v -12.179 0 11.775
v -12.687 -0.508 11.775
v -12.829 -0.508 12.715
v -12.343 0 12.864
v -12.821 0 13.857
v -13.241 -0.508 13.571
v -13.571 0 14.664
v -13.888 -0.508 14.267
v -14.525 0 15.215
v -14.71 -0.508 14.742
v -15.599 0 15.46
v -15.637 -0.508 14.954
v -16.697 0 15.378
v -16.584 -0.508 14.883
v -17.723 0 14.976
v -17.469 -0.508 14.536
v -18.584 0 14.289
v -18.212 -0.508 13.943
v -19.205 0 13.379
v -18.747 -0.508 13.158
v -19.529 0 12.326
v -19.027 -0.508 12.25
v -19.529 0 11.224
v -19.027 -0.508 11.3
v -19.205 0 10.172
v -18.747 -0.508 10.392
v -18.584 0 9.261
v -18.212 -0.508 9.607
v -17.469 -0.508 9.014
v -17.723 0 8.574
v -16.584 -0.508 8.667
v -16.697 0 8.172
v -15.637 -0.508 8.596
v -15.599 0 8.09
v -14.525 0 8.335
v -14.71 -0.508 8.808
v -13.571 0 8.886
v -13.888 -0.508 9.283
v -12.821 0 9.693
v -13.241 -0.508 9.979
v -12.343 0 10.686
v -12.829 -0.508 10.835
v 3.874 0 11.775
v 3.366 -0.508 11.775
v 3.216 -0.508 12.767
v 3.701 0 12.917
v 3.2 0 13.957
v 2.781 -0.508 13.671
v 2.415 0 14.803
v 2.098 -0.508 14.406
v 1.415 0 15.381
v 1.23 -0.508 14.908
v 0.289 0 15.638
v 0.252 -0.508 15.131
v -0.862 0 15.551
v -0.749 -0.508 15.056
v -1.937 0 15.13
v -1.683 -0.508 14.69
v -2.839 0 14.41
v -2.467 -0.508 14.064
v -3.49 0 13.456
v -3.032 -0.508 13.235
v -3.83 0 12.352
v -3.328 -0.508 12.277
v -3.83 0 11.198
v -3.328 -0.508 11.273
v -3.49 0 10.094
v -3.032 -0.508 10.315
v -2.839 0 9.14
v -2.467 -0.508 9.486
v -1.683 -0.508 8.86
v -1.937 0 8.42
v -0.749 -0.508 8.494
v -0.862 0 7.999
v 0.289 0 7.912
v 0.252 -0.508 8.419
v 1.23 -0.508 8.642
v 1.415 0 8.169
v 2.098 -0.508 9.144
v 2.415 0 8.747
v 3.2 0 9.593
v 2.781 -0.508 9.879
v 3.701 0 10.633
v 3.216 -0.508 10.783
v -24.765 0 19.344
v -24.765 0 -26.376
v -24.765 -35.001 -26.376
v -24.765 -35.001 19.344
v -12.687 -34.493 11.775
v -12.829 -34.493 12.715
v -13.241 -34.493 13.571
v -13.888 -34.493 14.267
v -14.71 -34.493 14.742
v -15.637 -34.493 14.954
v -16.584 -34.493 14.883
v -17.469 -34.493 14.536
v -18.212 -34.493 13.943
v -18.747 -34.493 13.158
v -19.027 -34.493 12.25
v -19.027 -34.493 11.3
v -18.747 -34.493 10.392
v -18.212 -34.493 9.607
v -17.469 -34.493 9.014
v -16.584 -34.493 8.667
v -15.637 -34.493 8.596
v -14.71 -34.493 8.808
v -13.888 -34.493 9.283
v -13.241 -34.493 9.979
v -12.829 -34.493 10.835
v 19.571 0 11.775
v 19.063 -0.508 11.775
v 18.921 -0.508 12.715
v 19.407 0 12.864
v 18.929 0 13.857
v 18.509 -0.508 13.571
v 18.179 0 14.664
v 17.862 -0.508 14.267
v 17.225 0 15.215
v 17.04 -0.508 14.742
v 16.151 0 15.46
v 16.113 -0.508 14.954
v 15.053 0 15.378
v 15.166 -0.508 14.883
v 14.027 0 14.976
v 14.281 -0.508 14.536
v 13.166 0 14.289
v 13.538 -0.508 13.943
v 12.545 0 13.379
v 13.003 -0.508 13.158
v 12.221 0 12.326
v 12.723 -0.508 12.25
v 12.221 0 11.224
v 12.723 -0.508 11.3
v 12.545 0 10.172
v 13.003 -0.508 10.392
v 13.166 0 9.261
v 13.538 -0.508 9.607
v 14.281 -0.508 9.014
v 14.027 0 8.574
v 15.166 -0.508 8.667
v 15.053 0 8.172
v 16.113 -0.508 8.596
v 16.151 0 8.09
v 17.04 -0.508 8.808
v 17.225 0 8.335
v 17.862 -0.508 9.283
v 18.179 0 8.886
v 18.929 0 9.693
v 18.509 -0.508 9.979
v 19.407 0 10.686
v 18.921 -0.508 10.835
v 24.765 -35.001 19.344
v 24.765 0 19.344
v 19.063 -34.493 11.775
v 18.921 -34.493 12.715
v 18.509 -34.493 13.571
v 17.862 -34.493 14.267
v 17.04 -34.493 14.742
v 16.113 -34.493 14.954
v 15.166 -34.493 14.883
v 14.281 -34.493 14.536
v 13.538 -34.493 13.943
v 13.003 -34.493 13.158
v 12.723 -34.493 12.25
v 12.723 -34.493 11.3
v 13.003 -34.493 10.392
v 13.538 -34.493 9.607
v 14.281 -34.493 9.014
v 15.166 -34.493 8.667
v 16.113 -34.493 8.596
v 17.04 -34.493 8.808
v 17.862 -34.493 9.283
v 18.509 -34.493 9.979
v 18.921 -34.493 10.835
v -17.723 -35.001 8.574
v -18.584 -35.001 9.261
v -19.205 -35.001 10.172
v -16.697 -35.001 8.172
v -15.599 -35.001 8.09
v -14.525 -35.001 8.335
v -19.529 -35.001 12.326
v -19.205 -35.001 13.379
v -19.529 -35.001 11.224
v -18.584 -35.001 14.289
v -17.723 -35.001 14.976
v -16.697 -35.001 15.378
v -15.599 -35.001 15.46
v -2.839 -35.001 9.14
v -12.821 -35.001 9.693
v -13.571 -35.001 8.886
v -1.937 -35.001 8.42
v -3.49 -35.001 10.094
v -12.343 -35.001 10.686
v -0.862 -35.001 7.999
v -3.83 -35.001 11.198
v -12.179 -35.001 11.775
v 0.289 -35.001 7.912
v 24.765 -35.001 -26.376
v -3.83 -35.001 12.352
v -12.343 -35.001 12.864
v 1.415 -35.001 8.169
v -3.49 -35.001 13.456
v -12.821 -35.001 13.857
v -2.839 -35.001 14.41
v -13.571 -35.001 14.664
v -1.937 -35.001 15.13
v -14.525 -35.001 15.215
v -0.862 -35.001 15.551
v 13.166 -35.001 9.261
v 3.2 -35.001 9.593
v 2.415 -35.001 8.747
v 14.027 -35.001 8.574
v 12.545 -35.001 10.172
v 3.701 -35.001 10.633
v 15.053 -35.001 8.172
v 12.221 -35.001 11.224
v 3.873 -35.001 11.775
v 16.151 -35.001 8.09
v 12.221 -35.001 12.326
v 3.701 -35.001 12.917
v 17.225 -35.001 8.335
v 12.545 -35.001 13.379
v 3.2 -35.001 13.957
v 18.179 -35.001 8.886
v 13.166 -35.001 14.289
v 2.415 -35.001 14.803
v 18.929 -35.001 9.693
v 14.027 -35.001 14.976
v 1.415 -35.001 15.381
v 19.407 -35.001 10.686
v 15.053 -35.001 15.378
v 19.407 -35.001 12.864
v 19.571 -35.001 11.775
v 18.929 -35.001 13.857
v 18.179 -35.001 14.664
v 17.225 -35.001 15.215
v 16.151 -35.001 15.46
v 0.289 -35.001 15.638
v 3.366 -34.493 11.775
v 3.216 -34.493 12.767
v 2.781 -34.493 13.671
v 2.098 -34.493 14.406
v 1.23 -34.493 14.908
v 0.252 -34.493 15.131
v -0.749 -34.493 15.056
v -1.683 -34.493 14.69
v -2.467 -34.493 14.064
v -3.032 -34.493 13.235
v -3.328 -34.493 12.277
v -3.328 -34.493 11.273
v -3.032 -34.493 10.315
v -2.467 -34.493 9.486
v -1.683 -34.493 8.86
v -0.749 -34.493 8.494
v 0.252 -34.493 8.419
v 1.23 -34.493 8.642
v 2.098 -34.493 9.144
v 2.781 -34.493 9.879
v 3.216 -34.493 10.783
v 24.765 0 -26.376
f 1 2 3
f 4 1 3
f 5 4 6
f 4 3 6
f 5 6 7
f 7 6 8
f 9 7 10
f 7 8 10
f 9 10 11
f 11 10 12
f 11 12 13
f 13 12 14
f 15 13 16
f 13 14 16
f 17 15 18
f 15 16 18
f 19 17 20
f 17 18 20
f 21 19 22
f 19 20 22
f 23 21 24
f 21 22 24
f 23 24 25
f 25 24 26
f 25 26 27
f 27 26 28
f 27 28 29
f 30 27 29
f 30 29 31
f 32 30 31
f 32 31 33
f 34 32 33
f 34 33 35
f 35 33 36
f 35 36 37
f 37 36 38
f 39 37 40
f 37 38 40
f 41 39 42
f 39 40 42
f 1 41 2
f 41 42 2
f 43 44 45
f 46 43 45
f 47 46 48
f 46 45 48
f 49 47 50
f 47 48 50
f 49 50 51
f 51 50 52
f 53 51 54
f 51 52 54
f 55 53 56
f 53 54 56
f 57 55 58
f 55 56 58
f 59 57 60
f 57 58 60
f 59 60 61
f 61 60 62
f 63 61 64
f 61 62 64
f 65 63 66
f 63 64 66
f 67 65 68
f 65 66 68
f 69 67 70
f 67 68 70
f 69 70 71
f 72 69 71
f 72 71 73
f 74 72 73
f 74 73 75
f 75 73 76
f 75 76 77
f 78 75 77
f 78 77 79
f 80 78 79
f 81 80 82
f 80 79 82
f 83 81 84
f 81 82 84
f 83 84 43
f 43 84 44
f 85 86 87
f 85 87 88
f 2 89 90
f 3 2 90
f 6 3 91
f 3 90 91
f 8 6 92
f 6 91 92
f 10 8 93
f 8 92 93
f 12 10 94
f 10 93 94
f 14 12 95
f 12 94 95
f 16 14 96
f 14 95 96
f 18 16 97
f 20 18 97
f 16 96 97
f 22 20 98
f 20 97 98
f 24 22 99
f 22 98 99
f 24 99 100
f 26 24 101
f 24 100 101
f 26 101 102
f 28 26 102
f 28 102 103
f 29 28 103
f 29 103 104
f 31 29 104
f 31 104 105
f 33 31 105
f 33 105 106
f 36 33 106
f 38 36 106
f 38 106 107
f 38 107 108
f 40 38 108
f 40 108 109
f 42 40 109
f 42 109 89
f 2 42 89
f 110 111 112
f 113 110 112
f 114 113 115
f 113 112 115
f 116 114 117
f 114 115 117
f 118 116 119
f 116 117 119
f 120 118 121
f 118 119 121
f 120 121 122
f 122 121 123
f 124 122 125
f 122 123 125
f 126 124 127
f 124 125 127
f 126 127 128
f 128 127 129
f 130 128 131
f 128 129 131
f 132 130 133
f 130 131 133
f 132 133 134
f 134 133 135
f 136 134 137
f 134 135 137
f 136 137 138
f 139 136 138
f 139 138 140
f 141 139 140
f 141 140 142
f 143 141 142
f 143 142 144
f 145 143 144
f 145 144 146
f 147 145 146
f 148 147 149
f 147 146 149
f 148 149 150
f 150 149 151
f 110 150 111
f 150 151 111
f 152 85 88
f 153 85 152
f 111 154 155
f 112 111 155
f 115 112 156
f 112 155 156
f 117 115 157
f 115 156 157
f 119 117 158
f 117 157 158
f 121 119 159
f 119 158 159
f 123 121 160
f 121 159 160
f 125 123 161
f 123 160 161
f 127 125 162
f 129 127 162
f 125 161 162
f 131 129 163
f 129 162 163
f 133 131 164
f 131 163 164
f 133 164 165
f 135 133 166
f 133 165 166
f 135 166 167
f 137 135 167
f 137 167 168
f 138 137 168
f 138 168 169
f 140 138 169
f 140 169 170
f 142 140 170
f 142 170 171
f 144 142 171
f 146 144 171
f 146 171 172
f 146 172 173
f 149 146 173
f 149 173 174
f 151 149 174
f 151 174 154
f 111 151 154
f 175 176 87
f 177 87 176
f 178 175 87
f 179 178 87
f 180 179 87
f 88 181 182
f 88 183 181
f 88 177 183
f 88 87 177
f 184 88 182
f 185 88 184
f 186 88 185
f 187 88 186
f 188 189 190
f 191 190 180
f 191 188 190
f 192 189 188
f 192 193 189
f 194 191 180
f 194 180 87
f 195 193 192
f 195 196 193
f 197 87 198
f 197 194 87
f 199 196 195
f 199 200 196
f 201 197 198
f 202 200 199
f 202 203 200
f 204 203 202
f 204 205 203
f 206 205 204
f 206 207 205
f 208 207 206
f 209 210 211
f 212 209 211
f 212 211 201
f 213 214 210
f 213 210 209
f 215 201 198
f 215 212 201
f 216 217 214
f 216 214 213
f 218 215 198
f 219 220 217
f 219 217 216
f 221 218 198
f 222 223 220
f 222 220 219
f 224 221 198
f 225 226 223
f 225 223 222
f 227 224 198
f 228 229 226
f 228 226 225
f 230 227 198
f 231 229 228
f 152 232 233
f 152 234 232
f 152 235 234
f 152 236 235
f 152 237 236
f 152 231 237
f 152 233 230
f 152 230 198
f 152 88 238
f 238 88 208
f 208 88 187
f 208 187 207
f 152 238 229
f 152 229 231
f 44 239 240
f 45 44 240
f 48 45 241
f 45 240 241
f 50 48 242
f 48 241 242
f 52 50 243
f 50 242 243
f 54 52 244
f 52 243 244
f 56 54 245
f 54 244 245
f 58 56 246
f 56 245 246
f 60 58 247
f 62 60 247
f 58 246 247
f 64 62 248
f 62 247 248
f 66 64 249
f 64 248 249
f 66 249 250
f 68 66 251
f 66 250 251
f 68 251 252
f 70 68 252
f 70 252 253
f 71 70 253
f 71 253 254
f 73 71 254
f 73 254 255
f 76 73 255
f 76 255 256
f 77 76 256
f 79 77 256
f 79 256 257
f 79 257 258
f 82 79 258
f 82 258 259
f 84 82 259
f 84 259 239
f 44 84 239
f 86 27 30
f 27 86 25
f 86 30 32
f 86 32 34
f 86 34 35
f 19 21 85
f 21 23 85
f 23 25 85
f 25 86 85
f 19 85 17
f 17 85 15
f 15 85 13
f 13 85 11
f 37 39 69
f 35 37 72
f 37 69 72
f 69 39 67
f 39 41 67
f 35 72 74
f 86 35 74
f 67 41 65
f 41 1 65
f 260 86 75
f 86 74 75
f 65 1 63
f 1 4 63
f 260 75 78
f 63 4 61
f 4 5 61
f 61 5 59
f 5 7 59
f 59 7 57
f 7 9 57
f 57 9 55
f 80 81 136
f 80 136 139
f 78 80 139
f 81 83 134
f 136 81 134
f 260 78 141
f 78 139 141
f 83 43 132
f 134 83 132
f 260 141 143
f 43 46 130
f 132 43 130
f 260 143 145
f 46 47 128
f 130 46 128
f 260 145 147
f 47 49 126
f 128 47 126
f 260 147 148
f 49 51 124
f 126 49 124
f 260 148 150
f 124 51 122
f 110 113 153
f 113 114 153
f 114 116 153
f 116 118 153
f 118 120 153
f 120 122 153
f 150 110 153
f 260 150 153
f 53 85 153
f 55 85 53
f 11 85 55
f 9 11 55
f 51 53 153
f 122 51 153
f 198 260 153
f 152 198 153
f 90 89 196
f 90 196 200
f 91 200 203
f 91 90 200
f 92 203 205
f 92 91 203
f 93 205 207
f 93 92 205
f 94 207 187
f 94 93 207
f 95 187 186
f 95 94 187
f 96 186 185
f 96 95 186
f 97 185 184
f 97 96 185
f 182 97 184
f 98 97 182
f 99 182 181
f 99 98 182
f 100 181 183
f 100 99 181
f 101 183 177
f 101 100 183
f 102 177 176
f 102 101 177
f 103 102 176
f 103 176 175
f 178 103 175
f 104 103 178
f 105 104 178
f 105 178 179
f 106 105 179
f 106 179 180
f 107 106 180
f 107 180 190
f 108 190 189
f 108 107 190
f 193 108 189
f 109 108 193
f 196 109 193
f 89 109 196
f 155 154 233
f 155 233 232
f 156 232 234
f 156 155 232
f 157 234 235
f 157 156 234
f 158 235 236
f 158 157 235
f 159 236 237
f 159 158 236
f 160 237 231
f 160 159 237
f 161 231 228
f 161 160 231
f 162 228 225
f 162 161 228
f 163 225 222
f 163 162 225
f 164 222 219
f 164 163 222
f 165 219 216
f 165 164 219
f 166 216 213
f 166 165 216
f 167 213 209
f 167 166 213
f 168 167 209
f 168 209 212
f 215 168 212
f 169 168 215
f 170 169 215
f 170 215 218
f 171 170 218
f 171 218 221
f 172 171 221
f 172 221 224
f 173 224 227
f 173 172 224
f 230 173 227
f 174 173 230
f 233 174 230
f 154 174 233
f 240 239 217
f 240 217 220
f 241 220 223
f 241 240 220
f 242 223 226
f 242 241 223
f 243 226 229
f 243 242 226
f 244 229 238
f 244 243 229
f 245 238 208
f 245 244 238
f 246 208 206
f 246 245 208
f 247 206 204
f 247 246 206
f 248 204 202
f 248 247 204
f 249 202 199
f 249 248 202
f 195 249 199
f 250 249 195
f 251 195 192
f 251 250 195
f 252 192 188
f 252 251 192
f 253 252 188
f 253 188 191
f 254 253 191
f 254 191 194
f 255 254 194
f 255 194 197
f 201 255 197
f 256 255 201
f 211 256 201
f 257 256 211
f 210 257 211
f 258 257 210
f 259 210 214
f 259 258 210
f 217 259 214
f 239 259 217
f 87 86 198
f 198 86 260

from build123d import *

# Parameters (mm, degrees)
F0_W     = 49.53
F0_H     = 45.72
F1_DEPTH = 35.0012
F3_R     = 3.1877
F4_DEPTH = 35.0022
F3_R_2   = 3.3655
F5_DEPTH = 35.0022
F6_SIZE  = 0.508


with BuildPart() as f1:
    # F0 (on Front) → F1 (new body)
    with BuildSketch(Plane.XZ):
        with Locations((0, -3.515769)):
            Rectangle(F0_W, F0_H)
    extrude(amount=F1_DEPTH)

    # F3 (on face) → F4 (cut, through all)
    with BuildSketch(Plane.XZ.offset(35.0012)):
        with Locations((-15.875, 11.775031)):
            Circle(F3_R)
        with Locations((15.875, 11.775031)):
            Circle(F3_R)
    extrude(amount=-F4_DEPTH, mode=Mode.SUBTRACT)

    # F3 (on face) → F5 (cut, through all)
    with BuildSketch(Plane.XZ.offset(35.0012)):
        with Locations((0, 11.775031)):
            Circle(F3_R_2)
    extrude(amount=-F5_DEPTH, mode=Mode.SUBTRACT)

    # F6
    f6_edges = [f1.edges().sort_by_distance(p)[0] for p in [
        (-3.3655, 0, 11.775031),
        (12.6873, -35.0012, 11.775031),
        (-3.3655, -35.0012, 11.775031),
        (-19.0627, -35.0012, 11.775031),
        (12.6873, 0, 11.775031),
        (-19.0627, 0, 11.775031),
    ]]
    chamfer(f6_edges, length=F6_SIZE)


solid = f1.part
